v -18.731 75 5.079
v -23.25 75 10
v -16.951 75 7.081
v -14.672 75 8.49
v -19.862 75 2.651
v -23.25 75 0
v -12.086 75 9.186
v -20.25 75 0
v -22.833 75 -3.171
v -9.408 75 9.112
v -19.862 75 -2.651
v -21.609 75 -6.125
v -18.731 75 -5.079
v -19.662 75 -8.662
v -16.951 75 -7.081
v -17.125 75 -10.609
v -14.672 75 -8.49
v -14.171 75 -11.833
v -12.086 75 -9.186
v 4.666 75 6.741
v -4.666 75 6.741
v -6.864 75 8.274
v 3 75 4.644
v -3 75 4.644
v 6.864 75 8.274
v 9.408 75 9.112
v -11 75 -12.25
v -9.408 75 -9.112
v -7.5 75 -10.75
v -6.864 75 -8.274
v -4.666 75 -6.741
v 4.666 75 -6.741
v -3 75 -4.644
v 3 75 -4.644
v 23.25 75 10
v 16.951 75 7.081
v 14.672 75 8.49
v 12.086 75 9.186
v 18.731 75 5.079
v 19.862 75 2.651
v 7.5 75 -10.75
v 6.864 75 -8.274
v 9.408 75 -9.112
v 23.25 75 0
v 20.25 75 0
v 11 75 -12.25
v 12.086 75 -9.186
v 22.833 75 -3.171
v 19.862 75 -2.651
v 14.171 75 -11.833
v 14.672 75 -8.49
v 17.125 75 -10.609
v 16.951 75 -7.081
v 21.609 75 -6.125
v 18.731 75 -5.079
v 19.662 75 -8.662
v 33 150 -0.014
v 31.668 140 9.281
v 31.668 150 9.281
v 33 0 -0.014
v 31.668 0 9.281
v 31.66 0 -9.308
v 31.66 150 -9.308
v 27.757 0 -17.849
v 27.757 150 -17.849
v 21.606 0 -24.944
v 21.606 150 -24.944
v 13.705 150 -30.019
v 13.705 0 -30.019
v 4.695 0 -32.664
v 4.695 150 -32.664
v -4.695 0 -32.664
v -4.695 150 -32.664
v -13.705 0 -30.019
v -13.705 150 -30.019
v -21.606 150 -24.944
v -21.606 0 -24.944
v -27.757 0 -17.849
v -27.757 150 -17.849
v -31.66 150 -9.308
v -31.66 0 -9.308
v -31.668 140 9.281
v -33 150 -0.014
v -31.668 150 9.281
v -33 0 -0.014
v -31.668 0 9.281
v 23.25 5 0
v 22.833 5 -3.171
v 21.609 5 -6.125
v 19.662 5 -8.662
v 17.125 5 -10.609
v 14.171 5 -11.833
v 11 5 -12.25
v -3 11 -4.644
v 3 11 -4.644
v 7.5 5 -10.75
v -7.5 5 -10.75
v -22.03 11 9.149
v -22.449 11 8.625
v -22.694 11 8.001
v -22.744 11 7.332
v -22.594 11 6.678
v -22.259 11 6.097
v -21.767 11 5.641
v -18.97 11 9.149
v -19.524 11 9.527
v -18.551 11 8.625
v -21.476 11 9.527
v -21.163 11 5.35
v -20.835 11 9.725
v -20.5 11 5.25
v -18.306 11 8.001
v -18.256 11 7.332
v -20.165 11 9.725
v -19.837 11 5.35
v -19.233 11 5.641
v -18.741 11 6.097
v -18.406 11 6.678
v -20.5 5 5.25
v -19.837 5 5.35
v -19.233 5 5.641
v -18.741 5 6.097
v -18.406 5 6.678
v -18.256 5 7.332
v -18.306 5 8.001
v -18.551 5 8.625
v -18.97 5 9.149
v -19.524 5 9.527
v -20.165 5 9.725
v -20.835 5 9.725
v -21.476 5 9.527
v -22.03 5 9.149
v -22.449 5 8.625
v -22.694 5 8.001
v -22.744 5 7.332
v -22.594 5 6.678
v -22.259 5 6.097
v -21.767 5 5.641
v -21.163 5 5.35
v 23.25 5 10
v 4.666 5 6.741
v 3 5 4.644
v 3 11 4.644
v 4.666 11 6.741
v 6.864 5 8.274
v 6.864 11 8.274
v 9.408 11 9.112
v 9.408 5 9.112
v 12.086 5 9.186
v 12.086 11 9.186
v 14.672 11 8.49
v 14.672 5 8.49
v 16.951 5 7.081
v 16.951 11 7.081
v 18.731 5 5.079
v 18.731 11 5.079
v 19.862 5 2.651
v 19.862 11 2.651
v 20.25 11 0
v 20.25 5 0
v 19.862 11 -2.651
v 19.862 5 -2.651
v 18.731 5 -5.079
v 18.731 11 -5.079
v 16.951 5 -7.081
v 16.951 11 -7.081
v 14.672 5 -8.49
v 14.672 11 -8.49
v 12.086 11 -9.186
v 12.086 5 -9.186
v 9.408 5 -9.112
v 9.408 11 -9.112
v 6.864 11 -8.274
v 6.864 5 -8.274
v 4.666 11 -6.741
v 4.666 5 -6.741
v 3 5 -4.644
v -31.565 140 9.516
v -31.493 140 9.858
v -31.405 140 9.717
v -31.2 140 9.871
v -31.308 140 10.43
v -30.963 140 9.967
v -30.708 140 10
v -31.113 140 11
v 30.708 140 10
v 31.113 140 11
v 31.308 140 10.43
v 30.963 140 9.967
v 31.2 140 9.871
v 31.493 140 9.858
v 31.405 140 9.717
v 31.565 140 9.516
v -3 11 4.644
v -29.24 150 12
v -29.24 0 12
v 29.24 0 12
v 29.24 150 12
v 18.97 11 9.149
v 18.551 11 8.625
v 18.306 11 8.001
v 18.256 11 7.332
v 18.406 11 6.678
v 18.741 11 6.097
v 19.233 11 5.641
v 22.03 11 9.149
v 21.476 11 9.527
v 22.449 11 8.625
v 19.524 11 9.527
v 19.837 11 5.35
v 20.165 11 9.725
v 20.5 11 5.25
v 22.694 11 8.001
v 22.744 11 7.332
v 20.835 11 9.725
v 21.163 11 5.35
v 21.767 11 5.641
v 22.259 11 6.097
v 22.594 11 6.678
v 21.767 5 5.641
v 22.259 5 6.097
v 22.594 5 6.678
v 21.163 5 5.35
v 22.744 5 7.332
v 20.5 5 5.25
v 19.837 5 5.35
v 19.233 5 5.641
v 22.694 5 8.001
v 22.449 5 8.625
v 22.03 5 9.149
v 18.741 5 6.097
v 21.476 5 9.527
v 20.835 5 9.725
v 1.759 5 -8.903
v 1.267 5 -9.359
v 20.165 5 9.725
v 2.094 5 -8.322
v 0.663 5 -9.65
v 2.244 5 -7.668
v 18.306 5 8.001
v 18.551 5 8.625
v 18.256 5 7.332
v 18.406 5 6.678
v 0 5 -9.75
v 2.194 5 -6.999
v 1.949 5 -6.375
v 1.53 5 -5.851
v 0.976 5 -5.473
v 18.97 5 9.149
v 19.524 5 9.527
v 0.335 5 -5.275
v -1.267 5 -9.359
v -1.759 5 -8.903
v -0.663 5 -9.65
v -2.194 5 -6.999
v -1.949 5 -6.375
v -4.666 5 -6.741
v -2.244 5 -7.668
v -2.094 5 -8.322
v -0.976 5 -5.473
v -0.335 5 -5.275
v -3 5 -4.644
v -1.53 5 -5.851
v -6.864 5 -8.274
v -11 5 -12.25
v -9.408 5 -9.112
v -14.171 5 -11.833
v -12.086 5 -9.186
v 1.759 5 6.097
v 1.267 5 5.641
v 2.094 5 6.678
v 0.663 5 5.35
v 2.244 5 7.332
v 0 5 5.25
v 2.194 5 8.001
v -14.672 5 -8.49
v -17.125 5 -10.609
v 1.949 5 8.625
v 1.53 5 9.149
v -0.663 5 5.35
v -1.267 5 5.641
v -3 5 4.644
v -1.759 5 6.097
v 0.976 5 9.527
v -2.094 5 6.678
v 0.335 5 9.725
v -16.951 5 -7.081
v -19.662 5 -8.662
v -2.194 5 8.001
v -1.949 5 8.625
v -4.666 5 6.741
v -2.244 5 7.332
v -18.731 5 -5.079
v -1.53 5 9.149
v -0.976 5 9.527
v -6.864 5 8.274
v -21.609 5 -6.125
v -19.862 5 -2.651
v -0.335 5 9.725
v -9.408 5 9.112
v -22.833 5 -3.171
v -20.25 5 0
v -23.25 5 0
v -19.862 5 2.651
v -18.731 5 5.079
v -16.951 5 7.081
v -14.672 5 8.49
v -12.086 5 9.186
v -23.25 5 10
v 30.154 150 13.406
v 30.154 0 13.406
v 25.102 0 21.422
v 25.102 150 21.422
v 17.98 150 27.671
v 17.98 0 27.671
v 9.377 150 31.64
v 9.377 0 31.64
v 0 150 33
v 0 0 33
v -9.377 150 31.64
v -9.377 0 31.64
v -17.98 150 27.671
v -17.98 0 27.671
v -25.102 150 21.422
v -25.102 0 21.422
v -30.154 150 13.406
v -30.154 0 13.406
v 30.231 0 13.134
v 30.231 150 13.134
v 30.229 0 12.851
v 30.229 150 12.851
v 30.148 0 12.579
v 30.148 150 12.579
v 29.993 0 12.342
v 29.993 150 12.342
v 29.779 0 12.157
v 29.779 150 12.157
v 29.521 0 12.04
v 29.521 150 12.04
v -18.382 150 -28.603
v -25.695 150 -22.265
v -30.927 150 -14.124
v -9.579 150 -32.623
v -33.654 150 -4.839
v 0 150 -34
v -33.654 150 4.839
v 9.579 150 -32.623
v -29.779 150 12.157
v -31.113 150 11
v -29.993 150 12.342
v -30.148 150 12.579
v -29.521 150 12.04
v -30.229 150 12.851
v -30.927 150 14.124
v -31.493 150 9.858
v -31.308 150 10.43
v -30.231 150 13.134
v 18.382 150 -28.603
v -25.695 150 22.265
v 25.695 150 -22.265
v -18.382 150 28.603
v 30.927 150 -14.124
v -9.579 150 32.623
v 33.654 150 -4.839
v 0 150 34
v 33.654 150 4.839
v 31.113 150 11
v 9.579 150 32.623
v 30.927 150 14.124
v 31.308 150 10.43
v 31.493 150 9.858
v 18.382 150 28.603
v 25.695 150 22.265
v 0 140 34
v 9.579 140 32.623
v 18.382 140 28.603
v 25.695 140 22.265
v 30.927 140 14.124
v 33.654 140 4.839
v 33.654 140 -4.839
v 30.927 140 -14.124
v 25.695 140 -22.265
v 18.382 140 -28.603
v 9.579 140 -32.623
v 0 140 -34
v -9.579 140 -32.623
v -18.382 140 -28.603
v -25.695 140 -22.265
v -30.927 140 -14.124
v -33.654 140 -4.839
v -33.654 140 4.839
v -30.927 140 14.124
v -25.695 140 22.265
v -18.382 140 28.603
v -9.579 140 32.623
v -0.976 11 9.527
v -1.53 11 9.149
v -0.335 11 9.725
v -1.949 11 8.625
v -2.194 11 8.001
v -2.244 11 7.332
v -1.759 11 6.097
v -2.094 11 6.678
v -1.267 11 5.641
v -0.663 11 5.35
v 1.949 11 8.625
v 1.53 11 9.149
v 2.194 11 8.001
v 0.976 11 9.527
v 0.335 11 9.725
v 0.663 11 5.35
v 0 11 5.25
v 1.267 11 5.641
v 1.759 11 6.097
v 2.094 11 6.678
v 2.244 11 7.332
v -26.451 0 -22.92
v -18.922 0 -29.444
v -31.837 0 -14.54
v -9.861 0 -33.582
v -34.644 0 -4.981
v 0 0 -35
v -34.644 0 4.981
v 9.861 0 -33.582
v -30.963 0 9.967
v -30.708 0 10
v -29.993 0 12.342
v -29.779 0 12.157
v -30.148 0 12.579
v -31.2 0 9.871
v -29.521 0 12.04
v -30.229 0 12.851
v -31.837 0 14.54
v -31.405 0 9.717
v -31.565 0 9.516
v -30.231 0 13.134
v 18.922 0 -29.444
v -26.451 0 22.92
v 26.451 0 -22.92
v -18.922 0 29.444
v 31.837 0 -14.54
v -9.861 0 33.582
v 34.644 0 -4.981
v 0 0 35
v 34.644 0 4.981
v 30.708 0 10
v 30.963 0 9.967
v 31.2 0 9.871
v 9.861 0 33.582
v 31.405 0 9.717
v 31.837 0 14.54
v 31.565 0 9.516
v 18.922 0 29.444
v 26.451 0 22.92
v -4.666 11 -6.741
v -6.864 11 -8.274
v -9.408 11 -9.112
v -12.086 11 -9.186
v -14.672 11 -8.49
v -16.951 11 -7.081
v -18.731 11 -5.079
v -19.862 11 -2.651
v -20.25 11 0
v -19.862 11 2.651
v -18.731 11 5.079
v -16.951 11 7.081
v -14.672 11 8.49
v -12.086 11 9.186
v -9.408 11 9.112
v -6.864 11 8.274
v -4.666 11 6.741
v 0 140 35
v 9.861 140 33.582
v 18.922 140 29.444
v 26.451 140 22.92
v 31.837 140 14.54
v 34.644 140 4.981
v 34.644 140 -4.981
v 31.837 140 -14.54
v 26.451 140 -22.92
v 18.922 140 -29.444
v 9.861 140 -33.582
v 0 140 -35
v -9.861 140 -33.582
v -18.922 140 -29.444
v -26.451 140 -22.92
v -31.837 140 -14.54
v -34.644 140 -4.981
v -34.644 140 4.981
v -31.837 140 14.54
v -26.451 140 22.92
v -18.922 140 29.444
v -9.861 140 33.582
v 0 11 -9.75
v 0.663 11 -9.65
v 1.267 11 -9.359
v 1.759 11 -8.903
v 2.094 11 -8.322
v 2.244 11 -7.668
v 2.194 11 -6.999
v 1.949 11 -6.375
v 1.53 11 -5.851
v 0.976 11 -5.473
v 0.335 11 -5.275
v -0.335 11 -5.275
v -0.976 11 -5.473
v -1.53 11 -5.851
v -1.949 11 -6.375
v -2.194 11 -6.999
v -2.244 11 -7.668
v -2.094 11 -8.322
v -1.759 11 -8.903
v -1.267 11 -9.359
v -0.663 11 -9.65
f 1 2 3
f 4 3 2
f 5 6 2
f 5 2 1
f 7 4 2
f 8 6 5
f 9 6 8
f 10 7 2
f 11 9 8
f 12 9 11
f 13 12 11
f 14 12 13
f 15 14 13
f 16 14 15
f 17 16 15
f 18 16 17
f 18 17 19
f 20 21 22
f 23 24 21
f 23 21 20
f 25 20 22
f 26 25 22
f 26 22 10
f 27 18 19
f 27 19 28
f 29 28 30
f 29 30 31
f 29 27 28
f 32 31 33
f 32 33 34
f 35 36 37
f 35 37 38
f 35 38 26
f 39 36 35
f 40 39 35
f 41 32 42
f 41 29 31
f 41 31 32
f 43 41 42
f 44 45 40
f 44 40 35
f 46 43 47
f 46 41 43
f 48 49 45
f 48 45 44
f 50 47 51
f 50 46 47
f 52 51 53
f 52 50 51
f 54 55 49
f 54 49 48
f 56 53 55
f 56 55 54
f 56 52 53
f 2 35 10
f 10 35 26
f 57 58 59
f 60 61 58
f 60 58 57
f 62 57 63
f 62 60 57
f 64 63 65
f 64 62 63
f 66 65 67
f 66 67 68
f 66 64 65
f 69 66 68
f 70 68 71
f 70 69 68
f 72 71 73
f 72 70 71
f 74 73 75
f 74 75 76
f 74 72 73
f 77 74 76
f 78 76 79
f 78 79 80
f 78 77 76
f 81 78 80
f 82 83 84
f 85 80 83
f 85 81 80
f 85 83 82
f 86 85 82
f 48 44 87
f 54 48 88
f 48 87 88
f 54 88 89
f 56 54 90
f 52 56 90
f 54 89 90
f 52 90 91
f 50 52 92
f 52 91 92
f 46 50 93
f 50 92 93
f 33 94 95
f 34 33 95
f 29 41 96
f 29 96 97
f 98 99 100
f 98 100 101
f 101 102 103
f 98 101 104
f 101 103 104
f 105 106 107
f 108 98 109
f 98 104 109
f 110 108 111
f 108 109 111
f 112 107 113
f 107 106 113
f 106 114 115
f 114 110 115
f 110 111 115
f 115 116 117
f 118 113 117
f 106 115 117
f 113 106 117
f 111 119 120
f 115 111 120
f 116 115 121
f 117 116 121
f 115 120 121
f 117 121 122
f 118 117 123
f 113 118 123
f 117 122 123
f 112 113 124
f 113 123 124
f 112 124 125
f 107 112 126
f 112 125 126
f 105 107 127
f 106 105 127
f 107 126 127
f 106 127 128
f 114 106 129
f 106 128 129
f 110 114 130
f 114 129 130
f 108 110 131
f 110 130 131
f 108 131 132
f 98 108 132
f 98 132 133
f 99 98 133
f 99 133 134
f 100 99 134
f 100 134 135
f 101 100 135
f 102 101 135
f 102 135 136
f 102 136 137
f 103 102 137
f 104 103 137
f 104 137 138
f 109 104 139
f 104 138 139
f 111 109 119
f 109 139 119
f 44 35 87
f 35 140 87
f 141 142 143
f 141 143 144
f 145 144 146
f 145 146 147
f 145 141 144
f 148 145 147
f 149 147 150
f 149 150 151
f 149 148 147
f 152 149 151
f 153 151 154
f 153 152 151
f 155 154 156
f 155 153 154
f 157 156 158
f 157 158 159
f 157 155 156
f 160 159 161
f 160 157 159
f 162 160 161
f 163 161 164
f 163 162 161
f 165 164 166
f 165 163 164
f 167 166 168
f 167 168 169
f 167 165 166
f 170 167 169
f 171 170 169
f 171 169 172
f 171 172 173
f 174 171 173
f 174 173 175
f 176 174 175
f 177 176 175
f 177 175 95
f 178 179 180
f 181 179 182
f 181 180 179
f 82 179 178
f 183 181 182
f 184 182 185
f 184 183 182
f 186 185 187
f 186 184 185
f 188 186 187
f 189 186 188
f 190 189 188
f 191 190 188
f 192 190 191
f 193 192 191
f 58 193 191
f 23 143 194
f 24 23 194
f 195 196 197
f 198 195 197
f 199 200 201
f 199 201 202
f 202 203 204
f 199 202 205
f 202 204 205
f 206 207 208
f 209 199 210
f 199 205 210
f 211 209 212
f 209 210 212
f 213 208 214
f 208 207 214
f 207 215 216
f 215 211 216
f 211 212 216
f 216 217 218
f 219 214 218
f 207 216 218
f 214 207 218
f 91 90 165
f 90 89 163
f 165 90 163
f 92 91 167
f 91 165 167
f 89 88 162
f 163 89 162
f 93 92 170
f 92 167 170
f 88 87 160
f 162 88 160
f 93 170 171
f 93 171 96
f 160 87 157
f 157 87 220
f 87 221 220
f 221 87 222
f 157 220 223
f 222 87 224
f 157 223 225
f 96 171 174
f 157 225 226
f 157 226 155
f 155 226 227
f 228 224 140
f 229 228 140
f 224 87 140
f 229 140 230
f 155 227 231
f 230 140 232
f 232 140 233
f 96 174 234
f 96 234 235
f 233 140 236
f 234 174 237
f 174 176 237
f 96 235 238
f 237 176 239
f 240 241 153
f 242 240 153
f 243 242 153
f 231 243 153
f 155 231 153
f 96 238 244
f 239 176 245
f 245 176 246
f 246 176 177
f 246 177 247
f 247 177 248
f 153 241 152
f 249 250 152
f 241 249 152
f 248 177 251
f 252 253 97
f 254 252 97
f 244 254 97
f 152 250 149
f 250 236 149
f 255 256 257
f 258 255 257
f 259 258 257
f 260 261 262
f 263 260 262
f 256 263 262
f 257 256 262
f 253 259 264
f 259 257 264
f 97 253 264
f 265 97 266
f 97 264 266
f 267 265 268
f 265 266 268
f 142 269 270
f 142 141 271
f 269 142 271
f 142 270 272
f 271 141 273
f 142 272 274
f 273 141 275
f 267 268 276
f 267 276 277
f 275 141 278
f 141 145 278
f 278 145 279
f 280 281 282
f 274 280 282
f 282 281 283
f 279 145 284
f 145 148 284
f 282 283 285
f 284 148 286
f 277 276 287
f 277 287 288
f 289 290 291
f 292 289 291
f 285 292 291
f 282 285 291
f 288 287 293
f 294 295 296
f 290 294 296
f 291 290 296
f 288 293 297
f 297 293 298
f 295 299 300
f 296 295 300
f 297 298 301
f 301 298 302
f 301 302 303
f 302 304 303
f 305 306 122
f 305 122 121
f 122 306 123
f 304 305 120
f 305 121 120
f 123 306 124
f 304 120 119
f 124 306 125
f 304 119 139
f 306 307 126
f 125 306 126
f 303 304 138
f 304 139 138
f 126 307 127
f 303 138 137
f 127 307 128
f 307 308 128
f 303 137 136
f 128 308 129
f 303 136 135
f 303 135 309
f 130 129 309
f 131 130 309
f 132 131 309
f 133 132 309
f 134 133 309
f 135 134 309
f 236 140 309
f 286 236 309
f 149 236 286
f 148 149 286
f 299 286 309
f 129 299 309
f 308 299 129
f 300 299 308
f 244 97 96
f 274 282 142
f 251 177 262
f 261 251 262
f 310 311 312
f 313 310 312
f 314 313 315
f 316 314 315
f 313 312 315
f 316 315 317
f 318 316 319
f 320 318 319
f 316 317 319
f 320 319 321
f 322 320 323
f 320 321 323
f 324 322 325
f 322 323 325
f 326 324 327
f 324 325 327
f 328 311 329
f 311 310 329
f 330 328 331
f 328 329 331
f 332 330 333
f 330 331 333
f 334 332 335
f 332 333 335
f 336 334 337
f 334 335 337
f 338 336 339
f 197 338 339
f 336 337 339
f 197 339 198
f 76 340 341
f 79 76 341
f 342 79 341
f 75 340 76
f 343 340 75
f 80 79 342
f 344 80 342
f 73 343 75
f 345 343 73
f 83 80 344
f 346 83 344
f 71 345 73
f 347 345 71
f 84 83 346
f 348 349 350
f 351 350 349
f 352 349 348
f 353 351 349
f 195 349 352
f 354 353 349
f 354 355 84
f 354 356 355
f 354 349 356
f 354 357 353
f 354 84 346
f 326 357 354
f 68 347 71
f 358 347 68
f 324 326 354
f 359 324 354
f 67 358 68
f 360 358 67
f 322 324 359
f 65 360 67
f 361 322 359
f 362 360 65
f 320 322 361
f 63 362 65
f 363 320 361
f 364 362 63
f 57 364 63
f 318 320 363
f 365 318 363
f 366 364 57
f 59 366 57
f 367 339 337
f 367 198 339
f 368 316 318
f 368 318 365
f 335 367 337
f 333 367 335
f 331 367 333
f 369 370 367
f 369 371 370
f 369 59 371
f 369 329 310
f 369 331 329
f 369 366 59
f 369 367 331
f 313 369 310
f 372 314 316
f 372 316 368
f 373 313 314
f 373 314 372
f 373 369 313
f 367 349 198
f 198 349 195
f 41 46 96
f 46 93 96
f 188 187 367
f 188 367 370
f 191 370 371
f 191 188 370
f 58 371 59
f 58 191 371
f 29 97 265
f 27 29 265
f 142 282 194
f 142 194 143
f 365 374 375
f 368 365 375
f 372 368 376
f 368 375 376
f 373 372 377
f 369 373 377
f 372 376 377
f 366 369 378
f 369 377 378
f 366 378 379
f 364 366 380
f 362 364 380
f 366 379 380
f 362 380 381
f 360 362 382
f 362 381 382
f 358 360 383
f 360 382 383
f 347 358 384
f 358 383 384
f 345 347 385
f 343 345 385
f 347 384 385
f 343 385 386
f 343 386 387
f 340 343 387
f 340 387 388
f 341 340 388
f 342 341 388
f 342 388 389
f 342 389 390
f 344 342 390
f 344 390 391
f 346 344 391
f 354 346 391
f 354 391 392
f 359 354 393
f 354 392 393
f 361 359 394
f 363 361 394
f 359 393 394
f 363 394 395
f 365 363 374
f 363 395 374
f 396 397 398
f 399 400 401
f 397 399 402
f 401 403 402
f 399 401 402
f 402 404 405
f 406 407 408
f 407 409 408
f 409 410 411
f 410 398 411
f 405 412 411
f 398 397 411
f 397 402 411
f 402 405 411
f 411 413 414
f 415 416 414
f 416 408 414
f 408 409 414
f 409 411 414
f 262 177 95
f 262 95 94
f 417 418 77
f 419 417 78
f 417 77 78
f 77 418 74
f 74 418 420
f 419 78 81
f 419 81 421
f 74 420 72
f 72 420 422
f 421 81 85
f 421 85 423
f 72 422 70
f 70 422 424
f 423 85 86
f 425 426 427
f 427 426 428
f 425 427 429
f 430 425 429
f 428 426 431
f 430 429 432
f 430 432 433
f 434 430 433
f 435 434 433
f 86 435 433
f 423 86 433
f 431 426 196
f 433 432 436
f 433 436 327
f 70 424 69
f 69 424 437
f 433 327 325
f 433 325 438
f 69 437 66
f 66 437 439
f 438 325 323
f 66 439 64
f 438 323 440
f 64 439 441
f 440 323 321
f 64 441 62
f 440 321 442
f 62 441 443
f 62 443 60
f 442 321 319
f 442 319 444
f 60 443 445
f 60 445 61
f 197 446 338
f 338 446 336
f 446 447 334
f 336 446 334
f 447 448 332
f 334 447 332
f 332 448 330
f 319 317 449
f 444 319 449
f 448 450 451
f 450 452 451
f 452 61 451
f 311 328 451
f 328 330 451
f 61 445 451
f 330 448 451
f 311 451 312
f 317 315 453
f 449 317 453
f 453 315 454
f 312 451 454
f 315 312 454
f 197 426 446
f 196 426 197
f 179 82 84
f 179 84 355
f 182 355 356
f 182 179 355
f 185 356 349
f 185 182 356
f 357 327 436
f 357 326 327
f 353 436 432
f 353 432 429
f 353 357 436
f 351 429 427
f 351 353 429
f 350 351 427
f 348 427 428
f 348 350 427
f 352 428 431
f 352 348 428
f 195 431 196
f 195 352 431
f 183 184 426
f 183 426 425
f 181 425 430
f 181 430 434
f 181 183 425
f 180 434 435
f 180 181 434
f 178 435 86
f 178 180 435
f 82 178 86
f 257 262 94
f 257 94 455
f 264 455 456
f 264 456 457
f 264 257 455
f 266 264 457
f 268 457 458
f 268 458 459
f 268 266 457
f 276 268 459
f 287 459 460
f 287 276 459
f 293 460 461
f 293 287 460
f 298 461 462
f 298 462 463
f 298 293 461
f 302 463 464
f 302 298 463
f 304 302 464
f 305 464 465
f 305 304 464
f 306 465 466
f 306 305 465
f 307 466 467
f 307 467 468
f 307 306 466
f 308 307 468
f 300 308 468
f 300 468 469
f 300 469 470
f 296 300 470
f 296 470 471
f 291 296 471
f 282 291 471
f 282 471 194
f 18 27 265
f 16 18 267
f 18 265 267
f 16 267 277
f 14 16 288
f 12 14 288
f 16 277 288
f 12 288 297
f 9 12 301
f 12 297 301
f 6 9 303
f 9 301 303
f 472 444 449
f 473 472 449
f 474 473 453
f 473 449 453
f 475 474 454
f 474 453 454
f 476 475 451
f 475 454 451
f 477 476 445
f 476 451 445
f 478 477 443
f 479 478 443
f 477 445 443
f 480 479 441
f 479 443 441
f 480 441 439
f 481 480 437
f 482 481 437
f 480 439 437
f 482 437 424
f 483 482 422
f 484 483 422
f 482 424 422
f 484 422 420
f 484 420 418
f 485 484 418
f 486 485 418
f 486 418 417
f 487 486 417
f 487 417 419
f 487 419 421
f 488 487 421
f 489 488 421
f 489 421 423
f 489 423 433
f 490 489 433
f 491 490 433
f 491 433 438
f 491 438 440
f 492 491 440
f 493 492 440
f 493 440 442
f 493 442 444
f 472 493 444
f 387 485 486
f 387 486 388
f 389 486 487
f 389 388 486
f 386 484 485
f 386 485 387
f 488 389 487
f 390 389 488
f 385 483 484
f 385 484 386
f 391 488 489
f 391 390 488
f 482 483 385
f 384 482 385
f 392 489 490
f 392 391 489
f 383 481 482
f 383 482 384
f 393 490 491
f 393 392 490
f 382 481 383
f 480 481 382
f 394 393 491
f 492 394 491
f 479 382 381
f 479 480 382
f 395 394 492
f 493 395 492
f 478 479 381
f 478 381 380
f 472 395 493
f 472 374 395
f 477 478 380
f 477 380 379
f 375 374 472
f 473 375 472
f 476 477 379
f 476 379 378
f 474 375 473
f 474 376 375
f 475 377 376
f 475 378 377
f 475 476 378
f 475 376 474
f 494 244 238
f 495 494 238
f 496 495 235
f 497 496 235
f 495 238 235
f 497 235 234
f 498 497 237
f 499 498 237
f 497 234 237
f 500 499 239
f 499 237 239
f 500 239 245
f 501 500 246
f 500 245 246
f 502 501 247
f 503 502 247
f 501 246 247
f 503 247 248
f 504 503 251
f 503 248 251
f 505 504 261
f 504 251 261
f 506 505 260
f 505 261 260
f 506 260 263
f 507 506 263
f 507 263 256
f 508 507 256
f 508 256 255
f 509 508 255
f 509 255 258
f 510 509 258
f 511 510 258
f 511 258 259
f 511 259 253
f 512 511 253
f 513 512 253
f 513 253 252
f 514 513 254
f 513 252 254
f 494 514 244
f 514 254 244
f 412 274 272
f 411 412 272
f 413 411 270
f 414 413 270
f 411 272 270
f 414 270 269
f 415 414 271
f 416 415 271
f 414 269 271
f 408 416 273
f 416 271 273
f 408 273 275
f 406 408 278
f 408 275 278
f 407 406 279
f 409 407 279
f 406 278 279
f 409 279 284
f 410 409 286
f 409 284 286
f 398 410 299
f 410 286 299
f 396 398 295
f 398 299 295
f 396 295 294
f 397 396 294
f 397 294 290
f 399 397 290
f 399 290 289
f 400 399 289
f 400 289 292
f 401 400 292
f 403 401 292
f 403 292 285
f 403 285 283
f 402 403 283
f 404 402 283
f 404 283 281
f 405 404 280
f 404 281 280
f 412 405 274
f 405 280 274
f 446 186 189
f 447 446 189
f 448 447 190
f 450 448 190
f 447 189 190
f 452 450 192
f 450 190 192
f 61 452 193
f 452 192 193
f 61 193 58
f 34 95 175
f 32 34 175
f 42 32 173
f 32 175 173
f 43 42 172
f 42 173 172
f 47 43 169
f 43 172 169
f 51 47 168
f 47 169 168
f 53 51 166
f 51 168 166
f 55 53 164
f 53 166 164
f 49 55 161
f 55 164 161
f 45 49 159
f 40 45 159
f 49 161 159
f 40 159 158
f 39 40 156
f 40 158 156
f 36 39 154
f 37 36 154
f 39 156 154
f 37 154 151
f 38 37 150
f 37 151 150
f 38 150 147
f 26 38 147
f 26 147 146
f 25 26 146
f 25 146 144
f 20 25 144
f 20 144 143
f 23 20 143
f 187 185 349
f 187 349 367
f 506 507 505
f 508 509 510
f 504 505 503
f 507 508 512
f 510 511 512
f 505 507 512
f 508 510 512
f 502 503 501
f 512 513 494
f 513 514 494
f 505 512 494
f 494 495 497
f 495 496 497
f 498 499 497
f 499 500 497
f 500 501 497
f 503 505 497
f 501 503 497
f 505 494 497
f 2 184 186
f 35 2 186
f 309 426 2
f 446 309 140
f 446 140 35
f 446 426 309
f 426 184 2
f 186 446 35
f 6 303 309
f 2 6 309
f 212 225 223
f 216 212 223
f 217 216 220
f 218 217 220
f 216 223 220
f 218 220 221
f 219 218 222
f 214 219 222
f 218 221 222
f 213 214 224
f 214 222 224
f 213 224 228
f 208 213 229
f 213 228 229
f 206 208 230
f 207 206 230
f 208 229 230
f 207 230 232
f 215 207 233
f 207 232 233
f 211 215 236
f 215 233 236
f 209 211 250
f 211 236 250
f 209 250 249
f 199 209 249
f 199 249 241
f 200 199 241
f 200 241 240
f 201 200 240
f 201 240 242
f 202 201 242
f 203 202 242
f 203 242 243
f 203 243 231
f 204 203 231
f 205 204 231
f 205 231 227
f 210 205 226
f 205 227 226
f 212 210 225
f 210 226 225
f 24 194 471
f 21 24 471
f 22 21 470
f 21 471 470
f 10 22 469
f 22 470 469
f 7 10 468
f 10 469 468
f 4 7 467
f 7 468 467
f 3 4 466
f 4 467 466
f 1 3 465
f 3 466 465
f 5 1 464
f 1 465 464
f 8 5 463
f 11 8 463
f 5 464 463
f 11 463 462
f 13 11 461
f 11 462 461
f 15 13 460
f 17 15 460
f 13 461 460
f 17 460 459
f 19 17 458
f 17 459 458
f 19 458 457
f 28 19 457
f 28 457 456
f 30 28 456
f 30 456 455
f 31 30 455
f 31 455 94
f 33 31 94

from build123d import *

# Parameters (mm, degrees)
SKETCH1_R           = 35
BOSS_EXTRUDE1_DEPTH = 150
FILLET1_R           = 1
CUT_EXTRUDE1_START  = -10
SKETCH3_R           = 35
SKETCH3_R_2         = 34
CUT_EXTRUDE1_DEPTH  = 10
BOSS_EXTRUDE2_START = -5
SKETCH4_R           = 2.25
BOSS_EXTRUDE2_DEPTH = 6
BOSS_EXTRUDE3_DEPTH = 64


with BuildPart() as part:
    # Sketch1 → Boss-Extrude1 (new body)
    with BuildSketch(Plane(origin=(0, 0, 0), x_dir=(1, 0, 0), z_dir=(0, 1, 0))):
        with Locations(Location((0, 0, 0), (0, 0, 270))):
            Circle(SKETCH1_R)
        with BuildLine():
            Line((-31.448370387, -10), (31.448370387, -10))
            ThreePointArc((31.448370387, -10), (0, 33), (-31.448370387, -10))
        make_face(mode=Mode.SUBTRACT)
        with BuildLine():
            Line((-30.740852298, -12), (30.740852298, -12))
            ThreePointArc((30.740852298, -12), (0, -33), (-30.740852298, -12))
        make_face(mode=Mode.SUBTRACT)
    extrude(amount=BOSS_EXTRUDE1_DEPTH)

    # Fillet1
    fillet1_edges = [part.edges().sort_by_distance(p)[0] for p in [
        (-30.740852298, 75, 12),
        (30.740852298, 75, 12),
        (31.448370387, 75, 10),
        (-31.448370387, 75, 10),
    ]]
    fillet(fillet1_edges, radius=FILLET1_R)

    # Sketch3 → Cut-Extrude1 (cut)
    # profile 1 of 2: a face of its own
    with BuildSketch(Plane(origin=(0, 150, 0), x_dir=(1, 0, 0), z_dir=(0, 1, 0)).offset(CUT_EXTRUDE1_START)):
        with Locations(Location((0, 0, 0), (0, 0, 270))):
            Circle(SKETCH3_R)
        with Locations(Location((0, 0, 0), (0, 0, 270))):
            Circle(SKETCH3_R_2, mode=Mode.SUBTRACT)
    # profile 2 of 2: a face of its own
    with BuildSketch(Plane(origin=(0, 150, 0), x_dir=(1, 0, 0), z_dir=(0, 1, 0)).offset(CUT_EXTRUDE1_START)):
        with BuildLine():
            Line((30.708305066, -10), (-30.708305066, -10))
            ThreePointArc((-30.708305066, -10), (-31.307784006, -9.80039053), (-31.667939599, -9.28125))
            ThreePointArc((-31.667939599, -9.28125), (-31.402080367, -10.144424508), (-31.112698372, -11))
            Line((-31.112698372, -11), (31.112698372, -11))
            ThreePointArc((31.112698372, -11), (31.402080367, -10.144424508), (31.667939599, -9.28125))
            ThreePointArc((31.667939599, -9.28125), (31.307784006, -9.80039053), (30.708305066, -10))
        make_face()
    extrude(amount=CUT_EXTRUDE1_DEPTH, mode=Mode.SUBTRACT)

    # Sketch4 → Boss-Extrude2 (add)
    with BuildSketch(Plane.XZ.offset(BOSS_EXTRUDE2_START)):
        with BuildLine():
            Line((-23.25, 10), (23.25, 10))
            Line((23.25, 10), (23.25, 0))
            ThreePointArc((23.25, 0), (19.66205807, -8.66205807), (11, -12.25))
            Line((11, -12.25), (7.5, -10.75))
            Line((7.5, -10.75), (-7.5, -10.75))
            Line((-7.5, -10.75), (-11, -12.25))
            ThreePointArc((-11, -12.25), (-19.66205807, -8.66205807), (-23.25, 0))
            Line((-23.25, 0), (-23.25, 10))
        make_face()
        with Locations(Location((0, -7.5, 0), (0, 0, 270))):
            Circle(SKETCH4_R, mode=Mode.SUBTRACT)
        with Locations(Location((20.5, 7.5, 0), (0, 0, 270))):
            Circle(SKETCH4_R, mode=Mode.SUBTRACT)
        with Locations(Location((-20.5, 7.5, 0), (0, 0, 270))):
            Circle(SKETCH4_R, mode=Mode.SUBTRACT)
        with Locations(Location((0, 7.5, 0), (0, 0, 270))):
            Circle(SKETCH4_R, mode=Mode.SUBTRACT)
        with BuildLine():
            Line((-3, 4.643543905), (3, 4.643543905))
            ThreePointArc((3, 4.643543905), (20.25, 0), (3, -4.643543905))
            Line((3, -4.643543905), (-3, -4.643543905))
            ThreePointArc((-3, -4.643543905), (-20.25, 0), (-3, 4.643543905))
        make_face(mode=Mode.SUBTRACT)
    extrude(amount=-BOSS_EXTRUDE2_DEPTH)

    # Sketch5 → Boss-Extrude3 (add)
    with BuildSketch(Plane(origin=(0, 11, 0), x_dir=(1, 0, 0), z_dir=(0, 1, 0))):
        with BuildLine():
            Line((-23.25, 0), (-23.25, -10))
            Line((-23.25, -10), (23.25, -10))
            Line((23.25, -10), (23.25, 0))
            ThreePointArc((23.25, 0), (19.66205807, 8.66205807), (11, 12.25))
            Line((11, 12.25), (7.5, 10.75))
            Line((7.5, 10.75), (-7.5, 10.75))
            Line((-7.5, 10.75), (-11, 12.25))
            ThreePointArc((-11, 12.25), (-19.66205807, 8.66205807), (-23.25, 0))
        make_face()
        with BuildLine():
            Line((3, -4.643543905), (-3, -4.643543905))
            ThreePointArc((-3, -4.643543905), (-20.25, 0), (-3, 4.643543905))
            Line((-3, 4.643543905), (3, 4.643543905))
            ThreePointArc((3, 4.643543905), (20.25, 0), (3, -4.643543905))
        make_face(mode=Mode.SUBTRACT)
    extrude(amount=BOSS_EXTRUDE3_DEPTH)


solid = part.part
